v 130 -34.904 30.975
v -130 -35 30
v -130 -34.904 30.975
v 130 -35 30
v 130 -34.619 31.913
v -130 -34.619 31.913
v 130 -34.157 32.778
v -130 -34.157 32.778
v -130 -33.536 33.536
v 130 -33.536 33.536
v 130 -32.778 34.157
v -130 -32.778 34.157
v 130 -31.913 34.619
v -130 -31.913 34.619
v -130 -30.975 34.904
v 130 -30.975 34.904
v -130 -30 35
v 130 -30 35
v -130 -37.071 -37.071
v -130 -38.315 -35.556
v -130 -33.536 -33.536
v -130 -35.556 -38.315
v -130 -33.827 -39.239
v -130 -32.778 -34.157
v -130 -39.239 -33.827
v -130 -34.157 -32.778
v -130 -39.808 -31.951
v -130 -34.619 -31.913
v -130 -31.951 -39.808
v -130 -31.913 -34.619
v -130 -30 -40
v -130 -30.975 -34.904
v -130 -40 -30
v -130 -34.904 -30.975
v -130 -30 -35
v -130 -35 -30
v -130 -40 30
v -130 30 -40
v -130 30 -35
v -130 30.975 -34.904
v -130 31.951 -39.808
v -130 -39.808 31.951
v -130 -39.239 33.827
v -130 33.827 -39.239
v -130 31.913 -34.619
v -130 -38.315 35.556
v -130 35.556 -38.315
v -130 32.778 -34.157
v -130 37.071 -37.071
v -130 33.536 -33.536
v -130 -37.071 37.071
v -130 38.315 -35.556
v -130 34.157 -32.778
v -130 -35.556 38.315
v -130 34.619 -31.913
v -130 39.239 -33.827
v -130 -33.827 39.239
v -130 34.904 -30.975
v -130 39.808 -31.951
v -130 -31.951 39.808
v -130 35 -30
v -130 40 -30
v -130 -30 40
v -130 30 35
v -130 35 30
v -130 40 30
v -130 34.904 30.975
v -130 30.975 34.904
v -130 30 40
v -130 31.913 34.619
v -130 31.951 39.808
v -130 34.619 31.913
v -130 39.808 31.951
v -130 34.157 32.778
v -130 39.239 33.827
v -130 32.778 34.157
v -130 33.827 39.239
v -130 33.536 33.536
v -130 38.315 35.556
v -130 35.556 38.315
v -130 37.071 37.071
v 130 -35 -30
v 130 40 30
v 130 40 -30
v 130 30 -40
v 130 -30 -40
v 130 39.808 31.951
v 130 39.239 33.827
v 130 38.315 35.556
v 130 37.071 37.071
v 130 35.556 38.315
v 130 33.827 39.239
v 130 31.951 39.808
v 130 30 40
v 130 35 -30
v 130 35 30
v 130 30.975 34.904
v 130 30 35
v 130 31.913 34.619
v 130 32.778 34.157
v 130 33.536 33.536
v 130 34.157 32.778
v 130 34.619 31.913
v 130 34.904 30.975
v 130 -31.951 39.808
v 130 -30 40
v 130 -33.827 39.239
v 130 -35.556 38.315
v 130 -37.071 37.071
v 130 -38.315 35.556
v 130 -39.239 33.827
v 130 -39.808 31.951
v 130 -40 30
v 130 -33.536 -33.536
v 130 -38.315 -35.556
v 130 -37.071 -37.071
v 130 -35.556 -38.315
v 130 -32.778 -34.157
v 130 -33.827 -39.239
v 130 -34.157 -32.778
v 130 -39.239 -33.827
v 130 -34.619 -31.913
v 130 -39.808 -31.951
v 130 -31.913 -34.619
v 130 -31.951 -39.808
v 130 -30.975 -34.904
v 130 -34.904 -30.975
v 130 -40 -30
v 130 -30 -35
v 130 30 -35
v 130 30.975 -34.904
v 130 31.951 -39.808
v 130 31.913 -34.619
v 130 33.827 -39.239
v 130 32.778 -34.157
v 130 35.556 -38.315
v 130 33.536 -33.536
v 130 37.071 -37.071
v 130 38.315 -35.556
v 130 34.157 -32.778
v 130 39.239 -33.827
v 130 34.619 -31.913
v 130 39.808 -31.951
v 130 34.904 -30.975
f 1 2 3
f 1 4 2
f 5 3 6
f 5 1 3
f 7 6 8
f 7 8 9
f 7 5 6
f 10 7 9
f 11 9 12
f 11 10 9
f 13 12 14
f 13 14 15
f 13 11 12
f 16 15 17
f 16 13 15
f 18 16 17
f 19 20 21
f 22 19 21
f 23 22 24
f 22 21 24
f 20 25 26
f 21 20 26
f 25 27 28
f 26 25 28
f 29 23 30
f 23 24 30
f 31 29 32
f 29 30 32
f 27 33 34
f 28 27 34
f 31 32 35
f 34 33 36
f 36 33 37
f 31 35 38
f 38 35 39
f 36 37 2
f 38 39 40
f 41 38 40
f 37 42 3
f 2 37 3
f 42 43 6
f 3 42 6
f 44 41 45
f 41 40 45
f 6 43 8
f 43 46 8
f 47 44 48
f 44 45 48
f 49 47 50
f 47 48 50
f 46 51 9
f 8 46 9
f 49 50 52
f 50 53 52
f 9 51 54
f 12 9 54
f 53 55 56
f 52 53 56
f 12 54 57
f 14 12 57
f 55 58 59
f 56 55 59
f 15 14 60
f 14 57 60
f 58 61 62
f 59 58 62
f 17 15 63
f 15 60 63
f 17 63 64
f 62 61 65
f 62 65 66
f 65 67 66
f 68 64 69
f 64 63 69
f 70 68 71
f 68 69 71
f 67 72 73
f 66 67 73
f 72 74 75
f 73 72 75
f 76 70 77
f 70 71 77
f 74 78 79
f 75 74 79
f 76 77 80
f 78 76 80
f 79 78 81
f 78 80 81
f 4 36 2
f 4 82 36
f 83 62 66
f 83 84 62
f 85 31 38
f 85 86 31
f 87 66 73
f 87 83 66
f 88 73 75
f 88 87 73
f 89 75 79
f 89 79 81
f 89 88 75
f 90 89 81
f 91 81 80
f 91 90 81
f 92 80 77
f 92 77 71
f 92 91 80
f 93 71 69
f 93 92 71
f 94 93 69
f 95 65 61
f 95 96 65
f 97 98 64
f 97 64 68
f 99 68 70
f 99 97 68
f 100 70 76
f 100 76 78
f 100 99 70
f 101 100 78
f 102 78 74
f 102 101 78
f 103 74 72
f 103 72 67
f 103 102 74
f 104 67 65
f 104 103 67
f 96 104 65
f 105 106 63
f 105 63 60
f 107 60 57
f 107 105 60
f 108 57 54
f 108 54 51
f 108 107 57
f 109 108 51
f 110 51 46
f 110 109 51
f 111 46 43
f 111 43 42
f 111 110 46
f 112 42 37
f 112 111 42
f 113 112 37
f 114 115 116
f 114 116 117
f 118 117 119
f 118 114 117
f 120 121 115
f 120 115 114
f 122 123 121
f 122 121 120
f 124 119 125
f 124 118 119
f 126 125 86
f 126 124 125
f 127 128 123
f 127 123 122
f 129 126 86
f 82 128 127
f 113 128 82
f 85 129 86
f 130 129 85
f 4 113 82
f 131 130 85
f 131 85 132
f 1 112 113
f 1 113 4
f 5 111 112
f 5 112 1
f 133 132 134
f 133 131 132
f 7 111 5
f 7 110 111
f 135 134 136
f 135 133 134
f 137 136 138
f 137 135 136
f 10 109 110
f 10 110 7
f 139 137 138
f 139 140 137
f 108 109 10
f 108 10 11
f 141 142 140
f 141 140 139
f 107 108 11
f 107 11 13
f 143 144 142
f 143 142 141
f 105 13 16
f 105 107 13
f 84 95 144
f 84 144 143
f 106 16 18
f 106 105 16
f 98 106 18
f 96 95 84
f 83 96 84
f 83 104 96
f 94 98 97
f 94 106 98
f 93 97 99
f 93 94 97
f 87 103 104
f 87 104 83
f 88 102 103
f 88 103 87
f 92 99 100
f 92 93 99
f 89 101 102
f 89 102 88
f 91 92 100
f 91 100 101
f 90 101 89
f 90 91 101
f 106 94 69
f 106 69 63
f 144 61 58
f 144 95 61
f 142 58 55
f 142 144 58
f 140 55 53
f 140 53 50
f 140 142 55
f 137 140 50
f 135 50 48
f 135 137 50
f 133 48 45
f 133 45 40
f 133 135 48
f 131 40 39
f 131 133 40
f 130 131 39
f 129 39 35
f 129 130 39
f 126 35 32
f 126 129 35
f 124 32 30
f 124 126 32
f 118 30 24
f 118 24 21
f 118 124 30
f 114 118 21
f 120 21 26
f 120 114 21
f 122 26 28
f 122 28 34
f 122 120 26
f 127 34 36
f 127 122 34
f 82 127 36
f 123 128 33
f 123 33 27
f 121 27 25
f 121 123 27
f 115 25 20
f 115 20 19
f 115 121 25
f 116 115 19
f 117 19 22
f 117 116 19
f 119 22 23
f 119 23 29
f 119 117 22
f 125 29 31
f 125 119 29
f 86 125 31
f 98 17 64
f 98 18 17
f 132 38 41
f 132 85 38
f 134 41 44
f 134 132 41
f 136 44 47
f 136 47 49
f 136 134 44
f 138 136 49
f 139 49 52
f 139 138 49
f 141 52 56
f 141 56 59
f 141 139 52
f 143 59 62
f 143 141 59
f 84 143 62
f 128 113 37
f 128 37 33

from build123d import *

# Parameters (mm, degrees)
F1_DEPTH = 130


with BuildPart() as f1:
    # F0 (on Right) → F1 (new body, symmetric)
    with BuildSketch(Plane.YZ):
        with BuildLine():
            ThreePointArc((40, 30), (37.071068, 37.071068), (30, 40))
            Line((30, 40), (-30, 40))
            ThreePointArc((-30, 40), (-37.071068, 37.071068), (-40, 30))
            Line((-40, 30), (-40, -30))
            ThreePointArc((-40, -30), (-37.071068, -37.071068), (-30, -40))
            Line((-30, -40), (30, -40))
            ThreePointArc((30, -40), (37.071068, -37.071068), (40, -30))
            Line((40, -30), (40, 30))
        make_face()
        with BuildLine():
            ThreePointArc((30, 35), (33.535534, 33.535534), (35, 30))
            Line((35, 30), (35, -30))
            ThreePointArc((35, -30), (33.535534, -33.535534), (30, -35))
            Line((30, -35), (-30, -35))
            ThreePointArc((-30, -35), (-33.535534, -33.535534), (-35, -30))
            Line((-35, -30), (-35, 30))
            ThreePointArc((-35, 30), (-33.535534, 33.535534), (-30, 35))
            Line((-30, 35), (30, 35))
        make_face(mode=Mode.SUBTRACT)
    extrude(amount=F1_DEPTH, both=True)


solid = f1.part
